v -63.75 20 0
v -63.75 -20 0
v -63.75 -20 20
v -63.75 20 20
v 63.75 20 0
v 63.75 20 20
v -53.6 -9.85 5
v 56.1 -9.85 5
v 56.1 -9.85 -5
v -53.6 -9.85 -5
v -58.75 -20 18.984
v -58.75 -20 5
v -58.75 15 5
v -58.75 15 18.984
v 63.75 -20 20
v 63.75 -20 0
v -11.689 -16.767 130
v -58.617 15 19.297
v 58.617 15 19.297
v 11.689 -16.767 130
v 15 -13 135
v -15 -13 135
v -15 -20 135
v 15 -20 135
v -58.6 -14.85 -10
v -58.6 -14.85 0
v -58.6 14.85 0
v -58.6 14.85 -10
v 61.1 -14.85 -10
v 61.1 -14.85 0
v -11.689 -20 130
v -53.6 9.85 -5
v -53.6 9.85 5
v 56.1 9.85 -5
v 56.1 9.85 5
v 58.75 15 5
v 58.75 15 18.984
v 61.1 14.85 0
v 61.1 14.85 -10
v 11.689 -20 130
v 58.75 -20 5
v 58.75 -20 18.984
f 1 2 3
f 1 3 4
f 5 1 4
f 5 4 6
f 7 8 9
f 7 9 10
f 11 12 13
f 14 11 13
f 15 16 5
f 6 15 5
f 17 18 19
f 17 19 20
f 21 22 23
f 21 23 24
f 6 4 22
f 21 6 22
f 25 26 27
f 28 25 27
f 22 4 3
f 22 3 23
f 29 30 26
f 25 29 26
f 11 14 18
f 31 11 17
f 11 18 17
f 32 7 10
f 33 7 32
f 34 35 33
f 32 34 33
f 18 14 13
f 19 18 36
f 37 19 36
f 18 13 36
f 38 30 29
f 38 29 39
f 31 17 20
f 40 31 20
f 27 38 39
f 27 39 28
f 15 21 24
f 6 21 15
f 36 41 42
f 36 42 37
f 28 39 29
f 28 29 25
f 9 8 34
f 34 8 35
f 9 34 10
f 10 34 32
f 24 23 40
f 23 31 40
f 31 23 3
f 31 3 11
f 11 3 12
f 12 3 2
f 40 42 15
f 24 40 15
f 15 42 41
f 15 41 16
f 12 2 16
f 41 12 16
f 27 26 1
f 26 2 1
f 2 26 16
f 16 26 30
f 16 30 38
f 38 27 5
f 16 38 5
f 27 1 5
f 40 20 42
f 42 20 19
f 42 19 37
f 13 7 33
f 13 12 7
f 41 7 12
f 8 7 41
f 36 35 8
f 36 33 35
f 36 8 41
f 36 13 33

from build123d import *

# Parameters (mm, degrees)
CROQUIS1_W              = 127.5
CROQUIS1_H              = 40
SALIENTE_EXTRUIR2_DEPTH = 135
CROQUIS3_W              = 119.7
CROQUIS3_H              = 29.7
SALIENTE_EXTRUIR3_DEPTH = 10
CORTAR_EXTRUIR1_DEPTH   = 184
CORTAR_EXTRUIR2_DEPTH   = 184
VACIADO1_T              = -5


with BuildPart() as part:
    # Croquis1 → Saliente-Extruir2 (new body)
    with BuildSketch(Plane.XY):
        Rectangle(CROQUIS1_W, CROQUIS1_H)
    extrude(amount=SALIENTE_EXTRUIR2_DEPTH)

    # Croquis3 → Saliente-Extruir3 (add)
    with BuildSketch(Plane(origin=(0, 0, 0), x_dir=(-1, 0, 0), z_dir=(0, 0, -1))):
        with Locations((-1.25, 0)):
            Rectangle(CROQUIS3_W, CROQUIS3_H)
    extrude(amount=SALIENTE_EXTRUIR3_DEPTH)

    # Croquis4 → Cortar-Extruir1 (cut)
    with BuildSketch(Plane.ZY.offset(63.75)):
        Polygon((135, 20), (20, 20), (135, -13), align=None)
    extrude(amount=-CORTAR_EXTRUIR1_DEPTH, mode=Mode.SUBTRACT)

    # Croquis5 → Cortar-Extruir2 (cut)
    with BuildSketch(Plane(origin=(0, 20, 0), x_dir=(1, 0, 0), z_dir=(0, 1, 0))):
        Polygon((-63.75, -20), (-15, -135), (15, -135), (63.75, -20), (107.189901301, -122.473613325), (58.694004086, -179.25211437), (-87.283869917, -146.849702978), align=None)
    extrude(amount=-CORTAR_EXTRUIR2_DEPTH, mode=Mode.SUBTRACT)

    # Vaciado1
    vaciado1_openings = [part.faces().sort_by_distance(p)[0] for p in [
        (0, -20, 53.411416263),
    ]]
    offset(amount=VACIADO1_T, openings=vaciado1_openings, kind=Kind.INTERSECTION)


solid = part.part
